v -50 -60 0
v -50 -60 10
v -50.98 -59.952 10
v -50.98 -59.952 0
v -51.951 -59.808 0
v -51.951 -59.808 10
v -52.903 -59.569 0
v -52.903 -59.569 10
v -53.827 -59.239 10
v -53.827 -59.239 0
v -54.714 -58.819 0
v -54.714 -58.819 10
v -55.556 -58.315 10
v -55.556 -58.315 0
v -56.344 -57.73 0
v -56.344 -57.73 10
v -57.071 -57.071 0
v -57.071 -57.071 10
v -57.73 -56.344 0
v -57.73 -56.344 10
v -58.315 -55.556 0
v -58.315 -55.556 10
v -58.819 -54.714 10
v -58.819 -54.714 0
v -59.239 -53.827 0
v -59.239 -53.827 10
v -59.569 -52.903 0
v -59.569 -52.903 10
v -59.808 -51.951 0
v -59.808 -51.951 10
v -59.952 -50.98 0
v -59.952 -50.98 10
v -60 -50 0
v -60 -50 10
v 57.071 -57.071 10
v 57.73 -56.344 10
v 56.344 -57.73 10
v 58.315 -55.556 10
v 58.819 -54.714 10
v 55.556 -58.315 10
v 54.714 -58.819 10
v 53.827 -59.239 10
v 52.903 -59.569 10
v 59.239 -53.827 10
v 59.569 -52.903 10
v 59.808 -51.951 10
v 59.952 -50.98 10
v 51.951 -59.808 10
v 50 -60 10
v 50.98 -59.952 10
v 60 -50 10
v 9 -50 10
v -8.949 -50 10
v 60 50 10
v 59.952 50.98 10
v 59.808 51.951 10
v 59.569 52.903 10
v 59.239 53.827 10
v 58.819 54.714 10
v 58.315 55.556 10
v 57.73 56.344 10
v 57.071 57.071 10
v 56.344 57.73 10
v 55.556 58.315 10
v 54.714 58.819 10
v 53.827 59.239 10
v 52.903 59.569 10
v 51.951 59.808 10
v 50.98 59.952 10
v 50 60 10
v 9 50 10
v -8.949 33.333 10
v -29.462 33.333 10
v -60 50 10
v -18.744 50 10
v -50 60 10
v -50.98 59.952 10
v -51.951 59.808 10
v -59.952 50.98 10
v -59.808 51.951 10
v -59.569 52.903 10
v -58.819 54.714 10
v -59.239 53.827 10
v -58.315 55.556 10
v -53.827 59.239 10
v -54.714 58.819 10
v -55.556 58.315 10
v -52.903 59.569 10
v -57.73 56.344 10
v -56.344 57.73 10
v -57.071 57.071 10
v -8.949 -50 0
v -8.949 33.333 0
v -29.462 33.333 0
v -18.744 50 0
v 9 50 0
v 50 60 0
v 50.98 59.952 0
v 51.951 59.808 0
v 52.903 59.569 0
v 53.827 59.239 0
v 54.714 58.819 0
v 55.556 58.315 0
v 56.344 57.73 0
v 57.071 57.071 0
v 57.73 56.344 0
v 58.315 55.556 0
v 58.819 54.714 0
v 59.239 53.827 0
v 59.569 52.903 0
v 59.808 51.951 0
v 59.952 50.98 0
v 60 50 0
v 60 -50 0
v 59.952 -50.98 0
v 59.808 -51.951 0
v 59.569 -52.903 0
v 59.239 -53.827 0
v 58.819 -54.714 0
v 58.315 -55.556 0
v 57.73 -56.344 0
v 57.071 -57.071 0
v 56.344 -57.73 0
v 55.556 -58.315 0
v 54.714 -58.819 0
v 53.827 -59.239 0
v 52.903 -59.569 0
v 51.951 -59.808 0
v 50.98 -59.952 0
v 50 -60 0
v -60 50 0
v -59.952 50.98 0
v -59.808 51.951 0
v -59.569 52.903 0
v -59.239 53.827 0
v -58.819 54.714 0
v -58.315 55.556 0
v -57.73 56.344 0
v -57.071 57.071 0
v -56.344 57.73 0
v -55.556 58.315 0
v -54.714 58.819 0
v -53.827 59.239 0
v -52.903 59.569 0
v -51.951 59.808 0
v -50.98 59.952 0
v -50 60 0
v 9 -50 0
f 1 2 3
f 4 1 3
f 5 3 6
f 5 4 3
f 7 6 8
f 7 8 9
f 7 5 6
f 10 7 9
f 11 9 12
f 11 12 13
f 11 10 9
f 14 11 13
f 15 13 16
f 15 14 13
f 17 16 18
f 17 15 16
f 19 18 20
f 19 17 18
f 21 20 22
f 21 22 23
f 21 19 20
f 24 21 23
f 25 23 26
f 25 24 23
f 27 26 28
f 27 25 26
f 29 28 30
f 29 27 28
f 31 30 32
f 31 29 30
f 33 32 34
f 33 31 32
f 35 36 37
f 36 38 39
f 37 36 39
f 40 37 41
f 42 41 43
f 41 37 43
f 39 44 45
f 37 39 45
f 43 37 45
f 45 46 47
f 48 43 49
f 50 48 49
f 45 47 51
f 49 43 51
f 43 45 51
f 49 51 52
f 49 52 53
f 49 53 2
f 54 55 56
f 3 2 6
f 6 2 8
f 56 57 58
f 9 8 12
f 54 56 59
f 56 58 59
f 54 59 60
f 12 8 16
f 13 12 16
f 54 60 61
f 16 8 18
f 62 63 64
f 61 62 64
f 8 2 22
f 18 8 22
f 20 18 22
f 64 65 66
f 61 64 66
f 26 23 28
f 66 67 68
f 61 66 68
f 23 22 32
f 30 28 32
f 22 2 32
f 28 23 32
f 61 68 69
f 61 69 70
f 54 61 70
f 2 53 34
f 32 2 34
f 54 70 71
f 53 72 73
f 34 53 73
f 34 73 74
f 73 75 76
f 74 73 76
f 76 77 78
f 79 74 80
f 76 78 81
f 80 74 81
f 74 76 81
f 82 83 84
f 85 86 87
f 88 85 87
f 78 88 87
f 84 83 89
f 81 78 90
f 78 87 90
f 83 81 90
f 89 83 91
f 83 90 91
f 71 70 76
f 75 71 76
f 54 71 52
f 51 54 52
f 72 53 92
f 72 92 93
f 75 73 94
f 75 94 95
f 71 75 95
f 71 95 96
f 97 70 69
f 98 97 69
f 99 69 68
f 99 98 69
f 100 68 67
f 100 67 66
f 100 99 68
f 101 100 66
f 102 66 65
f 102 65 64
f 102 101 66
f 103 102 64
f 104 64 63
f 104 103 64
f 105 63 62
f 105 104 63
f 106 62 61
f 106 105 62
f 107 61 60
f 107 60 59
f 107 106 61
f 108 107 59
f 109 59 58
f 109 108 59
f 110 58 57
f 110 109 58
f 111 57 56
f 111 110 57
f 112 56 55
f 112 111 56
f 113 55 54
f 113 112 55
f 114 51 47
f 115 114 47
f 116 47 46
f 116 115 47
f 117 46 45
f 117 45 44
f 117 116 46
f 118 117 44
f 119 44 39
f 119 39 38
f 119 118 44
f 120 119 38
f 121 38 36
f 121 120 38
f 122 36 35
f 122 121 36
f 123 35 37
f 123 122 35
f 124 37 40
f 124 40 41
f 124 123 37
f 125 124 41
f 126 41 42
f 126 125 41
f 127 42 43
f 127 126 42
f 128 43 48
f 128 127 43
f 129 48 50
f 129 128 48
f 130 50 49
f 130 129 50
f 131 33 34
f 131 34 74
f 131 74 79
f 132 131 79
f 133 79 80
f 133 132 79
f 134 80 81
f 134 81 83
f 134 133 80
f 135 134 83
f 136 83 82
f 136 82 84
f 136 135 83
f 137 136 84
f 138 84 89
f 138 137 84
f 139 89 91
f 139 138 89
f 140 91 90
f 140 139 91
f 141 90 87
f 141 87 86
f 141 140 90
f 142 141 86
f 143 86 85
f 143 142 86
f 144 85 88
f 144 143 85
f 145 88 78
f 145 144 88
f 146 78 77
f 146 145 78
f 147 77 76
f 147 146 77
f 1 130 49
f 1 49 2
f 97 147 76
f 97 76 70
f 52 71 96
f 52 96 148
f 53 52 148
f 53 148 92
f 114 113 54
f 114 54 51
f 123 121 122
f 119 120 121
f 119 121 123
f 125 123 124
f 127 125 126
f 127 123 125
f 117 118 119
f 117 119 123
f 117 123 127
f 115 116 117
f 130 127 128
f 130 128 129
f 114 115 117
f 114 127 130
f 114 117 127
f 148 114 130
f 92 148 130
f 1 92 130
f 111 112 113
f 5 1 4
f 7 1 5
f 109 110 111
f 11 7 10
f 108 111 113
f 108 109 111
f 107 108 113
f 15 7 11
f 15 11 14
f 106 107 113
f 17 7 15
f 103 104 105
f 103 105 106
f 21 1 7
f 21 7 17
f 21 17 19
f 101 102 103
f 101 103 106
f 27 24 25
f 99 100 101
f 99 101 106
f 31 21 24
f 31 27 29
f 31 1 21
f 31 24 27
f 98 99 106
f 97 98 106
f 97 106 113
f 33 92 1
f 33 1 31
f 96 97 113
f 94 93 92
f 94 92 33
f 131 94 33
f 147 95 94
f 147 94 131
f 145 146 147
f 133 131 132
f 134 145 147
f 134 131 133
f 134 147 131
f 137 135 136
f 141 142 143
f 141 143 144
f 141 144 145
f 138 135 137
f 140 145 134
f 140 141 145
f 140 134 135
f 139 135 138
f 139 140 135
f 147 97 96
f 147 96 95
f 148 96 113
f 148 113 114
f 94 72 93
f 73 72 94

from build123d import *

# Parameters (mm, degrees)
BOSS_EXTRUDE1_DEPTH = 10
CUT_EXTRUDE2_DEPTH  = 10


with BuildPart() as part:
    # Sketch1 → Boss-Extrude1 (new body)
    with BuildSketch(Plane.XY):
        with BuildLine():
            Line((-50, 60), (50, 60))
            ThreePointArc((50, 60), (57.071067812, 57.071067812), (60, 50))
            Line((60, 50), (60, -50))
            ThreePointArc((60, -50), (57.071067812, -57.071067812), (50, -60))
            Line((50, -60), (-50, -60))
            ThreePointArc((-50, -60), (-57.071067812, -57.071067812), (-60, -50))
            Line((-60, -50), (-60, 50))
            ThreePointArc((-60, 50), (-57.071067812, 57.071067812), (-50, 60))
        make_face()
    extrude(amount=BOSS_EXTRUDE1_DEPTH)

    # Sketch2 → Cut-Extrude2 (cut)
    with BuildSketch(Plane.XY.offset(10)):
        Polygon((-18.744391026, 50), (9, 50), (9, -50), (-8.948717949, -50), (-8.948717949, 33.333333333), (-29.461538462, 33.333333333), align=None)
    extrude(amount=-CUT_EXTRUDE2_DEPTH, mode=Mode.SUBTRACT)


solid = part.part
